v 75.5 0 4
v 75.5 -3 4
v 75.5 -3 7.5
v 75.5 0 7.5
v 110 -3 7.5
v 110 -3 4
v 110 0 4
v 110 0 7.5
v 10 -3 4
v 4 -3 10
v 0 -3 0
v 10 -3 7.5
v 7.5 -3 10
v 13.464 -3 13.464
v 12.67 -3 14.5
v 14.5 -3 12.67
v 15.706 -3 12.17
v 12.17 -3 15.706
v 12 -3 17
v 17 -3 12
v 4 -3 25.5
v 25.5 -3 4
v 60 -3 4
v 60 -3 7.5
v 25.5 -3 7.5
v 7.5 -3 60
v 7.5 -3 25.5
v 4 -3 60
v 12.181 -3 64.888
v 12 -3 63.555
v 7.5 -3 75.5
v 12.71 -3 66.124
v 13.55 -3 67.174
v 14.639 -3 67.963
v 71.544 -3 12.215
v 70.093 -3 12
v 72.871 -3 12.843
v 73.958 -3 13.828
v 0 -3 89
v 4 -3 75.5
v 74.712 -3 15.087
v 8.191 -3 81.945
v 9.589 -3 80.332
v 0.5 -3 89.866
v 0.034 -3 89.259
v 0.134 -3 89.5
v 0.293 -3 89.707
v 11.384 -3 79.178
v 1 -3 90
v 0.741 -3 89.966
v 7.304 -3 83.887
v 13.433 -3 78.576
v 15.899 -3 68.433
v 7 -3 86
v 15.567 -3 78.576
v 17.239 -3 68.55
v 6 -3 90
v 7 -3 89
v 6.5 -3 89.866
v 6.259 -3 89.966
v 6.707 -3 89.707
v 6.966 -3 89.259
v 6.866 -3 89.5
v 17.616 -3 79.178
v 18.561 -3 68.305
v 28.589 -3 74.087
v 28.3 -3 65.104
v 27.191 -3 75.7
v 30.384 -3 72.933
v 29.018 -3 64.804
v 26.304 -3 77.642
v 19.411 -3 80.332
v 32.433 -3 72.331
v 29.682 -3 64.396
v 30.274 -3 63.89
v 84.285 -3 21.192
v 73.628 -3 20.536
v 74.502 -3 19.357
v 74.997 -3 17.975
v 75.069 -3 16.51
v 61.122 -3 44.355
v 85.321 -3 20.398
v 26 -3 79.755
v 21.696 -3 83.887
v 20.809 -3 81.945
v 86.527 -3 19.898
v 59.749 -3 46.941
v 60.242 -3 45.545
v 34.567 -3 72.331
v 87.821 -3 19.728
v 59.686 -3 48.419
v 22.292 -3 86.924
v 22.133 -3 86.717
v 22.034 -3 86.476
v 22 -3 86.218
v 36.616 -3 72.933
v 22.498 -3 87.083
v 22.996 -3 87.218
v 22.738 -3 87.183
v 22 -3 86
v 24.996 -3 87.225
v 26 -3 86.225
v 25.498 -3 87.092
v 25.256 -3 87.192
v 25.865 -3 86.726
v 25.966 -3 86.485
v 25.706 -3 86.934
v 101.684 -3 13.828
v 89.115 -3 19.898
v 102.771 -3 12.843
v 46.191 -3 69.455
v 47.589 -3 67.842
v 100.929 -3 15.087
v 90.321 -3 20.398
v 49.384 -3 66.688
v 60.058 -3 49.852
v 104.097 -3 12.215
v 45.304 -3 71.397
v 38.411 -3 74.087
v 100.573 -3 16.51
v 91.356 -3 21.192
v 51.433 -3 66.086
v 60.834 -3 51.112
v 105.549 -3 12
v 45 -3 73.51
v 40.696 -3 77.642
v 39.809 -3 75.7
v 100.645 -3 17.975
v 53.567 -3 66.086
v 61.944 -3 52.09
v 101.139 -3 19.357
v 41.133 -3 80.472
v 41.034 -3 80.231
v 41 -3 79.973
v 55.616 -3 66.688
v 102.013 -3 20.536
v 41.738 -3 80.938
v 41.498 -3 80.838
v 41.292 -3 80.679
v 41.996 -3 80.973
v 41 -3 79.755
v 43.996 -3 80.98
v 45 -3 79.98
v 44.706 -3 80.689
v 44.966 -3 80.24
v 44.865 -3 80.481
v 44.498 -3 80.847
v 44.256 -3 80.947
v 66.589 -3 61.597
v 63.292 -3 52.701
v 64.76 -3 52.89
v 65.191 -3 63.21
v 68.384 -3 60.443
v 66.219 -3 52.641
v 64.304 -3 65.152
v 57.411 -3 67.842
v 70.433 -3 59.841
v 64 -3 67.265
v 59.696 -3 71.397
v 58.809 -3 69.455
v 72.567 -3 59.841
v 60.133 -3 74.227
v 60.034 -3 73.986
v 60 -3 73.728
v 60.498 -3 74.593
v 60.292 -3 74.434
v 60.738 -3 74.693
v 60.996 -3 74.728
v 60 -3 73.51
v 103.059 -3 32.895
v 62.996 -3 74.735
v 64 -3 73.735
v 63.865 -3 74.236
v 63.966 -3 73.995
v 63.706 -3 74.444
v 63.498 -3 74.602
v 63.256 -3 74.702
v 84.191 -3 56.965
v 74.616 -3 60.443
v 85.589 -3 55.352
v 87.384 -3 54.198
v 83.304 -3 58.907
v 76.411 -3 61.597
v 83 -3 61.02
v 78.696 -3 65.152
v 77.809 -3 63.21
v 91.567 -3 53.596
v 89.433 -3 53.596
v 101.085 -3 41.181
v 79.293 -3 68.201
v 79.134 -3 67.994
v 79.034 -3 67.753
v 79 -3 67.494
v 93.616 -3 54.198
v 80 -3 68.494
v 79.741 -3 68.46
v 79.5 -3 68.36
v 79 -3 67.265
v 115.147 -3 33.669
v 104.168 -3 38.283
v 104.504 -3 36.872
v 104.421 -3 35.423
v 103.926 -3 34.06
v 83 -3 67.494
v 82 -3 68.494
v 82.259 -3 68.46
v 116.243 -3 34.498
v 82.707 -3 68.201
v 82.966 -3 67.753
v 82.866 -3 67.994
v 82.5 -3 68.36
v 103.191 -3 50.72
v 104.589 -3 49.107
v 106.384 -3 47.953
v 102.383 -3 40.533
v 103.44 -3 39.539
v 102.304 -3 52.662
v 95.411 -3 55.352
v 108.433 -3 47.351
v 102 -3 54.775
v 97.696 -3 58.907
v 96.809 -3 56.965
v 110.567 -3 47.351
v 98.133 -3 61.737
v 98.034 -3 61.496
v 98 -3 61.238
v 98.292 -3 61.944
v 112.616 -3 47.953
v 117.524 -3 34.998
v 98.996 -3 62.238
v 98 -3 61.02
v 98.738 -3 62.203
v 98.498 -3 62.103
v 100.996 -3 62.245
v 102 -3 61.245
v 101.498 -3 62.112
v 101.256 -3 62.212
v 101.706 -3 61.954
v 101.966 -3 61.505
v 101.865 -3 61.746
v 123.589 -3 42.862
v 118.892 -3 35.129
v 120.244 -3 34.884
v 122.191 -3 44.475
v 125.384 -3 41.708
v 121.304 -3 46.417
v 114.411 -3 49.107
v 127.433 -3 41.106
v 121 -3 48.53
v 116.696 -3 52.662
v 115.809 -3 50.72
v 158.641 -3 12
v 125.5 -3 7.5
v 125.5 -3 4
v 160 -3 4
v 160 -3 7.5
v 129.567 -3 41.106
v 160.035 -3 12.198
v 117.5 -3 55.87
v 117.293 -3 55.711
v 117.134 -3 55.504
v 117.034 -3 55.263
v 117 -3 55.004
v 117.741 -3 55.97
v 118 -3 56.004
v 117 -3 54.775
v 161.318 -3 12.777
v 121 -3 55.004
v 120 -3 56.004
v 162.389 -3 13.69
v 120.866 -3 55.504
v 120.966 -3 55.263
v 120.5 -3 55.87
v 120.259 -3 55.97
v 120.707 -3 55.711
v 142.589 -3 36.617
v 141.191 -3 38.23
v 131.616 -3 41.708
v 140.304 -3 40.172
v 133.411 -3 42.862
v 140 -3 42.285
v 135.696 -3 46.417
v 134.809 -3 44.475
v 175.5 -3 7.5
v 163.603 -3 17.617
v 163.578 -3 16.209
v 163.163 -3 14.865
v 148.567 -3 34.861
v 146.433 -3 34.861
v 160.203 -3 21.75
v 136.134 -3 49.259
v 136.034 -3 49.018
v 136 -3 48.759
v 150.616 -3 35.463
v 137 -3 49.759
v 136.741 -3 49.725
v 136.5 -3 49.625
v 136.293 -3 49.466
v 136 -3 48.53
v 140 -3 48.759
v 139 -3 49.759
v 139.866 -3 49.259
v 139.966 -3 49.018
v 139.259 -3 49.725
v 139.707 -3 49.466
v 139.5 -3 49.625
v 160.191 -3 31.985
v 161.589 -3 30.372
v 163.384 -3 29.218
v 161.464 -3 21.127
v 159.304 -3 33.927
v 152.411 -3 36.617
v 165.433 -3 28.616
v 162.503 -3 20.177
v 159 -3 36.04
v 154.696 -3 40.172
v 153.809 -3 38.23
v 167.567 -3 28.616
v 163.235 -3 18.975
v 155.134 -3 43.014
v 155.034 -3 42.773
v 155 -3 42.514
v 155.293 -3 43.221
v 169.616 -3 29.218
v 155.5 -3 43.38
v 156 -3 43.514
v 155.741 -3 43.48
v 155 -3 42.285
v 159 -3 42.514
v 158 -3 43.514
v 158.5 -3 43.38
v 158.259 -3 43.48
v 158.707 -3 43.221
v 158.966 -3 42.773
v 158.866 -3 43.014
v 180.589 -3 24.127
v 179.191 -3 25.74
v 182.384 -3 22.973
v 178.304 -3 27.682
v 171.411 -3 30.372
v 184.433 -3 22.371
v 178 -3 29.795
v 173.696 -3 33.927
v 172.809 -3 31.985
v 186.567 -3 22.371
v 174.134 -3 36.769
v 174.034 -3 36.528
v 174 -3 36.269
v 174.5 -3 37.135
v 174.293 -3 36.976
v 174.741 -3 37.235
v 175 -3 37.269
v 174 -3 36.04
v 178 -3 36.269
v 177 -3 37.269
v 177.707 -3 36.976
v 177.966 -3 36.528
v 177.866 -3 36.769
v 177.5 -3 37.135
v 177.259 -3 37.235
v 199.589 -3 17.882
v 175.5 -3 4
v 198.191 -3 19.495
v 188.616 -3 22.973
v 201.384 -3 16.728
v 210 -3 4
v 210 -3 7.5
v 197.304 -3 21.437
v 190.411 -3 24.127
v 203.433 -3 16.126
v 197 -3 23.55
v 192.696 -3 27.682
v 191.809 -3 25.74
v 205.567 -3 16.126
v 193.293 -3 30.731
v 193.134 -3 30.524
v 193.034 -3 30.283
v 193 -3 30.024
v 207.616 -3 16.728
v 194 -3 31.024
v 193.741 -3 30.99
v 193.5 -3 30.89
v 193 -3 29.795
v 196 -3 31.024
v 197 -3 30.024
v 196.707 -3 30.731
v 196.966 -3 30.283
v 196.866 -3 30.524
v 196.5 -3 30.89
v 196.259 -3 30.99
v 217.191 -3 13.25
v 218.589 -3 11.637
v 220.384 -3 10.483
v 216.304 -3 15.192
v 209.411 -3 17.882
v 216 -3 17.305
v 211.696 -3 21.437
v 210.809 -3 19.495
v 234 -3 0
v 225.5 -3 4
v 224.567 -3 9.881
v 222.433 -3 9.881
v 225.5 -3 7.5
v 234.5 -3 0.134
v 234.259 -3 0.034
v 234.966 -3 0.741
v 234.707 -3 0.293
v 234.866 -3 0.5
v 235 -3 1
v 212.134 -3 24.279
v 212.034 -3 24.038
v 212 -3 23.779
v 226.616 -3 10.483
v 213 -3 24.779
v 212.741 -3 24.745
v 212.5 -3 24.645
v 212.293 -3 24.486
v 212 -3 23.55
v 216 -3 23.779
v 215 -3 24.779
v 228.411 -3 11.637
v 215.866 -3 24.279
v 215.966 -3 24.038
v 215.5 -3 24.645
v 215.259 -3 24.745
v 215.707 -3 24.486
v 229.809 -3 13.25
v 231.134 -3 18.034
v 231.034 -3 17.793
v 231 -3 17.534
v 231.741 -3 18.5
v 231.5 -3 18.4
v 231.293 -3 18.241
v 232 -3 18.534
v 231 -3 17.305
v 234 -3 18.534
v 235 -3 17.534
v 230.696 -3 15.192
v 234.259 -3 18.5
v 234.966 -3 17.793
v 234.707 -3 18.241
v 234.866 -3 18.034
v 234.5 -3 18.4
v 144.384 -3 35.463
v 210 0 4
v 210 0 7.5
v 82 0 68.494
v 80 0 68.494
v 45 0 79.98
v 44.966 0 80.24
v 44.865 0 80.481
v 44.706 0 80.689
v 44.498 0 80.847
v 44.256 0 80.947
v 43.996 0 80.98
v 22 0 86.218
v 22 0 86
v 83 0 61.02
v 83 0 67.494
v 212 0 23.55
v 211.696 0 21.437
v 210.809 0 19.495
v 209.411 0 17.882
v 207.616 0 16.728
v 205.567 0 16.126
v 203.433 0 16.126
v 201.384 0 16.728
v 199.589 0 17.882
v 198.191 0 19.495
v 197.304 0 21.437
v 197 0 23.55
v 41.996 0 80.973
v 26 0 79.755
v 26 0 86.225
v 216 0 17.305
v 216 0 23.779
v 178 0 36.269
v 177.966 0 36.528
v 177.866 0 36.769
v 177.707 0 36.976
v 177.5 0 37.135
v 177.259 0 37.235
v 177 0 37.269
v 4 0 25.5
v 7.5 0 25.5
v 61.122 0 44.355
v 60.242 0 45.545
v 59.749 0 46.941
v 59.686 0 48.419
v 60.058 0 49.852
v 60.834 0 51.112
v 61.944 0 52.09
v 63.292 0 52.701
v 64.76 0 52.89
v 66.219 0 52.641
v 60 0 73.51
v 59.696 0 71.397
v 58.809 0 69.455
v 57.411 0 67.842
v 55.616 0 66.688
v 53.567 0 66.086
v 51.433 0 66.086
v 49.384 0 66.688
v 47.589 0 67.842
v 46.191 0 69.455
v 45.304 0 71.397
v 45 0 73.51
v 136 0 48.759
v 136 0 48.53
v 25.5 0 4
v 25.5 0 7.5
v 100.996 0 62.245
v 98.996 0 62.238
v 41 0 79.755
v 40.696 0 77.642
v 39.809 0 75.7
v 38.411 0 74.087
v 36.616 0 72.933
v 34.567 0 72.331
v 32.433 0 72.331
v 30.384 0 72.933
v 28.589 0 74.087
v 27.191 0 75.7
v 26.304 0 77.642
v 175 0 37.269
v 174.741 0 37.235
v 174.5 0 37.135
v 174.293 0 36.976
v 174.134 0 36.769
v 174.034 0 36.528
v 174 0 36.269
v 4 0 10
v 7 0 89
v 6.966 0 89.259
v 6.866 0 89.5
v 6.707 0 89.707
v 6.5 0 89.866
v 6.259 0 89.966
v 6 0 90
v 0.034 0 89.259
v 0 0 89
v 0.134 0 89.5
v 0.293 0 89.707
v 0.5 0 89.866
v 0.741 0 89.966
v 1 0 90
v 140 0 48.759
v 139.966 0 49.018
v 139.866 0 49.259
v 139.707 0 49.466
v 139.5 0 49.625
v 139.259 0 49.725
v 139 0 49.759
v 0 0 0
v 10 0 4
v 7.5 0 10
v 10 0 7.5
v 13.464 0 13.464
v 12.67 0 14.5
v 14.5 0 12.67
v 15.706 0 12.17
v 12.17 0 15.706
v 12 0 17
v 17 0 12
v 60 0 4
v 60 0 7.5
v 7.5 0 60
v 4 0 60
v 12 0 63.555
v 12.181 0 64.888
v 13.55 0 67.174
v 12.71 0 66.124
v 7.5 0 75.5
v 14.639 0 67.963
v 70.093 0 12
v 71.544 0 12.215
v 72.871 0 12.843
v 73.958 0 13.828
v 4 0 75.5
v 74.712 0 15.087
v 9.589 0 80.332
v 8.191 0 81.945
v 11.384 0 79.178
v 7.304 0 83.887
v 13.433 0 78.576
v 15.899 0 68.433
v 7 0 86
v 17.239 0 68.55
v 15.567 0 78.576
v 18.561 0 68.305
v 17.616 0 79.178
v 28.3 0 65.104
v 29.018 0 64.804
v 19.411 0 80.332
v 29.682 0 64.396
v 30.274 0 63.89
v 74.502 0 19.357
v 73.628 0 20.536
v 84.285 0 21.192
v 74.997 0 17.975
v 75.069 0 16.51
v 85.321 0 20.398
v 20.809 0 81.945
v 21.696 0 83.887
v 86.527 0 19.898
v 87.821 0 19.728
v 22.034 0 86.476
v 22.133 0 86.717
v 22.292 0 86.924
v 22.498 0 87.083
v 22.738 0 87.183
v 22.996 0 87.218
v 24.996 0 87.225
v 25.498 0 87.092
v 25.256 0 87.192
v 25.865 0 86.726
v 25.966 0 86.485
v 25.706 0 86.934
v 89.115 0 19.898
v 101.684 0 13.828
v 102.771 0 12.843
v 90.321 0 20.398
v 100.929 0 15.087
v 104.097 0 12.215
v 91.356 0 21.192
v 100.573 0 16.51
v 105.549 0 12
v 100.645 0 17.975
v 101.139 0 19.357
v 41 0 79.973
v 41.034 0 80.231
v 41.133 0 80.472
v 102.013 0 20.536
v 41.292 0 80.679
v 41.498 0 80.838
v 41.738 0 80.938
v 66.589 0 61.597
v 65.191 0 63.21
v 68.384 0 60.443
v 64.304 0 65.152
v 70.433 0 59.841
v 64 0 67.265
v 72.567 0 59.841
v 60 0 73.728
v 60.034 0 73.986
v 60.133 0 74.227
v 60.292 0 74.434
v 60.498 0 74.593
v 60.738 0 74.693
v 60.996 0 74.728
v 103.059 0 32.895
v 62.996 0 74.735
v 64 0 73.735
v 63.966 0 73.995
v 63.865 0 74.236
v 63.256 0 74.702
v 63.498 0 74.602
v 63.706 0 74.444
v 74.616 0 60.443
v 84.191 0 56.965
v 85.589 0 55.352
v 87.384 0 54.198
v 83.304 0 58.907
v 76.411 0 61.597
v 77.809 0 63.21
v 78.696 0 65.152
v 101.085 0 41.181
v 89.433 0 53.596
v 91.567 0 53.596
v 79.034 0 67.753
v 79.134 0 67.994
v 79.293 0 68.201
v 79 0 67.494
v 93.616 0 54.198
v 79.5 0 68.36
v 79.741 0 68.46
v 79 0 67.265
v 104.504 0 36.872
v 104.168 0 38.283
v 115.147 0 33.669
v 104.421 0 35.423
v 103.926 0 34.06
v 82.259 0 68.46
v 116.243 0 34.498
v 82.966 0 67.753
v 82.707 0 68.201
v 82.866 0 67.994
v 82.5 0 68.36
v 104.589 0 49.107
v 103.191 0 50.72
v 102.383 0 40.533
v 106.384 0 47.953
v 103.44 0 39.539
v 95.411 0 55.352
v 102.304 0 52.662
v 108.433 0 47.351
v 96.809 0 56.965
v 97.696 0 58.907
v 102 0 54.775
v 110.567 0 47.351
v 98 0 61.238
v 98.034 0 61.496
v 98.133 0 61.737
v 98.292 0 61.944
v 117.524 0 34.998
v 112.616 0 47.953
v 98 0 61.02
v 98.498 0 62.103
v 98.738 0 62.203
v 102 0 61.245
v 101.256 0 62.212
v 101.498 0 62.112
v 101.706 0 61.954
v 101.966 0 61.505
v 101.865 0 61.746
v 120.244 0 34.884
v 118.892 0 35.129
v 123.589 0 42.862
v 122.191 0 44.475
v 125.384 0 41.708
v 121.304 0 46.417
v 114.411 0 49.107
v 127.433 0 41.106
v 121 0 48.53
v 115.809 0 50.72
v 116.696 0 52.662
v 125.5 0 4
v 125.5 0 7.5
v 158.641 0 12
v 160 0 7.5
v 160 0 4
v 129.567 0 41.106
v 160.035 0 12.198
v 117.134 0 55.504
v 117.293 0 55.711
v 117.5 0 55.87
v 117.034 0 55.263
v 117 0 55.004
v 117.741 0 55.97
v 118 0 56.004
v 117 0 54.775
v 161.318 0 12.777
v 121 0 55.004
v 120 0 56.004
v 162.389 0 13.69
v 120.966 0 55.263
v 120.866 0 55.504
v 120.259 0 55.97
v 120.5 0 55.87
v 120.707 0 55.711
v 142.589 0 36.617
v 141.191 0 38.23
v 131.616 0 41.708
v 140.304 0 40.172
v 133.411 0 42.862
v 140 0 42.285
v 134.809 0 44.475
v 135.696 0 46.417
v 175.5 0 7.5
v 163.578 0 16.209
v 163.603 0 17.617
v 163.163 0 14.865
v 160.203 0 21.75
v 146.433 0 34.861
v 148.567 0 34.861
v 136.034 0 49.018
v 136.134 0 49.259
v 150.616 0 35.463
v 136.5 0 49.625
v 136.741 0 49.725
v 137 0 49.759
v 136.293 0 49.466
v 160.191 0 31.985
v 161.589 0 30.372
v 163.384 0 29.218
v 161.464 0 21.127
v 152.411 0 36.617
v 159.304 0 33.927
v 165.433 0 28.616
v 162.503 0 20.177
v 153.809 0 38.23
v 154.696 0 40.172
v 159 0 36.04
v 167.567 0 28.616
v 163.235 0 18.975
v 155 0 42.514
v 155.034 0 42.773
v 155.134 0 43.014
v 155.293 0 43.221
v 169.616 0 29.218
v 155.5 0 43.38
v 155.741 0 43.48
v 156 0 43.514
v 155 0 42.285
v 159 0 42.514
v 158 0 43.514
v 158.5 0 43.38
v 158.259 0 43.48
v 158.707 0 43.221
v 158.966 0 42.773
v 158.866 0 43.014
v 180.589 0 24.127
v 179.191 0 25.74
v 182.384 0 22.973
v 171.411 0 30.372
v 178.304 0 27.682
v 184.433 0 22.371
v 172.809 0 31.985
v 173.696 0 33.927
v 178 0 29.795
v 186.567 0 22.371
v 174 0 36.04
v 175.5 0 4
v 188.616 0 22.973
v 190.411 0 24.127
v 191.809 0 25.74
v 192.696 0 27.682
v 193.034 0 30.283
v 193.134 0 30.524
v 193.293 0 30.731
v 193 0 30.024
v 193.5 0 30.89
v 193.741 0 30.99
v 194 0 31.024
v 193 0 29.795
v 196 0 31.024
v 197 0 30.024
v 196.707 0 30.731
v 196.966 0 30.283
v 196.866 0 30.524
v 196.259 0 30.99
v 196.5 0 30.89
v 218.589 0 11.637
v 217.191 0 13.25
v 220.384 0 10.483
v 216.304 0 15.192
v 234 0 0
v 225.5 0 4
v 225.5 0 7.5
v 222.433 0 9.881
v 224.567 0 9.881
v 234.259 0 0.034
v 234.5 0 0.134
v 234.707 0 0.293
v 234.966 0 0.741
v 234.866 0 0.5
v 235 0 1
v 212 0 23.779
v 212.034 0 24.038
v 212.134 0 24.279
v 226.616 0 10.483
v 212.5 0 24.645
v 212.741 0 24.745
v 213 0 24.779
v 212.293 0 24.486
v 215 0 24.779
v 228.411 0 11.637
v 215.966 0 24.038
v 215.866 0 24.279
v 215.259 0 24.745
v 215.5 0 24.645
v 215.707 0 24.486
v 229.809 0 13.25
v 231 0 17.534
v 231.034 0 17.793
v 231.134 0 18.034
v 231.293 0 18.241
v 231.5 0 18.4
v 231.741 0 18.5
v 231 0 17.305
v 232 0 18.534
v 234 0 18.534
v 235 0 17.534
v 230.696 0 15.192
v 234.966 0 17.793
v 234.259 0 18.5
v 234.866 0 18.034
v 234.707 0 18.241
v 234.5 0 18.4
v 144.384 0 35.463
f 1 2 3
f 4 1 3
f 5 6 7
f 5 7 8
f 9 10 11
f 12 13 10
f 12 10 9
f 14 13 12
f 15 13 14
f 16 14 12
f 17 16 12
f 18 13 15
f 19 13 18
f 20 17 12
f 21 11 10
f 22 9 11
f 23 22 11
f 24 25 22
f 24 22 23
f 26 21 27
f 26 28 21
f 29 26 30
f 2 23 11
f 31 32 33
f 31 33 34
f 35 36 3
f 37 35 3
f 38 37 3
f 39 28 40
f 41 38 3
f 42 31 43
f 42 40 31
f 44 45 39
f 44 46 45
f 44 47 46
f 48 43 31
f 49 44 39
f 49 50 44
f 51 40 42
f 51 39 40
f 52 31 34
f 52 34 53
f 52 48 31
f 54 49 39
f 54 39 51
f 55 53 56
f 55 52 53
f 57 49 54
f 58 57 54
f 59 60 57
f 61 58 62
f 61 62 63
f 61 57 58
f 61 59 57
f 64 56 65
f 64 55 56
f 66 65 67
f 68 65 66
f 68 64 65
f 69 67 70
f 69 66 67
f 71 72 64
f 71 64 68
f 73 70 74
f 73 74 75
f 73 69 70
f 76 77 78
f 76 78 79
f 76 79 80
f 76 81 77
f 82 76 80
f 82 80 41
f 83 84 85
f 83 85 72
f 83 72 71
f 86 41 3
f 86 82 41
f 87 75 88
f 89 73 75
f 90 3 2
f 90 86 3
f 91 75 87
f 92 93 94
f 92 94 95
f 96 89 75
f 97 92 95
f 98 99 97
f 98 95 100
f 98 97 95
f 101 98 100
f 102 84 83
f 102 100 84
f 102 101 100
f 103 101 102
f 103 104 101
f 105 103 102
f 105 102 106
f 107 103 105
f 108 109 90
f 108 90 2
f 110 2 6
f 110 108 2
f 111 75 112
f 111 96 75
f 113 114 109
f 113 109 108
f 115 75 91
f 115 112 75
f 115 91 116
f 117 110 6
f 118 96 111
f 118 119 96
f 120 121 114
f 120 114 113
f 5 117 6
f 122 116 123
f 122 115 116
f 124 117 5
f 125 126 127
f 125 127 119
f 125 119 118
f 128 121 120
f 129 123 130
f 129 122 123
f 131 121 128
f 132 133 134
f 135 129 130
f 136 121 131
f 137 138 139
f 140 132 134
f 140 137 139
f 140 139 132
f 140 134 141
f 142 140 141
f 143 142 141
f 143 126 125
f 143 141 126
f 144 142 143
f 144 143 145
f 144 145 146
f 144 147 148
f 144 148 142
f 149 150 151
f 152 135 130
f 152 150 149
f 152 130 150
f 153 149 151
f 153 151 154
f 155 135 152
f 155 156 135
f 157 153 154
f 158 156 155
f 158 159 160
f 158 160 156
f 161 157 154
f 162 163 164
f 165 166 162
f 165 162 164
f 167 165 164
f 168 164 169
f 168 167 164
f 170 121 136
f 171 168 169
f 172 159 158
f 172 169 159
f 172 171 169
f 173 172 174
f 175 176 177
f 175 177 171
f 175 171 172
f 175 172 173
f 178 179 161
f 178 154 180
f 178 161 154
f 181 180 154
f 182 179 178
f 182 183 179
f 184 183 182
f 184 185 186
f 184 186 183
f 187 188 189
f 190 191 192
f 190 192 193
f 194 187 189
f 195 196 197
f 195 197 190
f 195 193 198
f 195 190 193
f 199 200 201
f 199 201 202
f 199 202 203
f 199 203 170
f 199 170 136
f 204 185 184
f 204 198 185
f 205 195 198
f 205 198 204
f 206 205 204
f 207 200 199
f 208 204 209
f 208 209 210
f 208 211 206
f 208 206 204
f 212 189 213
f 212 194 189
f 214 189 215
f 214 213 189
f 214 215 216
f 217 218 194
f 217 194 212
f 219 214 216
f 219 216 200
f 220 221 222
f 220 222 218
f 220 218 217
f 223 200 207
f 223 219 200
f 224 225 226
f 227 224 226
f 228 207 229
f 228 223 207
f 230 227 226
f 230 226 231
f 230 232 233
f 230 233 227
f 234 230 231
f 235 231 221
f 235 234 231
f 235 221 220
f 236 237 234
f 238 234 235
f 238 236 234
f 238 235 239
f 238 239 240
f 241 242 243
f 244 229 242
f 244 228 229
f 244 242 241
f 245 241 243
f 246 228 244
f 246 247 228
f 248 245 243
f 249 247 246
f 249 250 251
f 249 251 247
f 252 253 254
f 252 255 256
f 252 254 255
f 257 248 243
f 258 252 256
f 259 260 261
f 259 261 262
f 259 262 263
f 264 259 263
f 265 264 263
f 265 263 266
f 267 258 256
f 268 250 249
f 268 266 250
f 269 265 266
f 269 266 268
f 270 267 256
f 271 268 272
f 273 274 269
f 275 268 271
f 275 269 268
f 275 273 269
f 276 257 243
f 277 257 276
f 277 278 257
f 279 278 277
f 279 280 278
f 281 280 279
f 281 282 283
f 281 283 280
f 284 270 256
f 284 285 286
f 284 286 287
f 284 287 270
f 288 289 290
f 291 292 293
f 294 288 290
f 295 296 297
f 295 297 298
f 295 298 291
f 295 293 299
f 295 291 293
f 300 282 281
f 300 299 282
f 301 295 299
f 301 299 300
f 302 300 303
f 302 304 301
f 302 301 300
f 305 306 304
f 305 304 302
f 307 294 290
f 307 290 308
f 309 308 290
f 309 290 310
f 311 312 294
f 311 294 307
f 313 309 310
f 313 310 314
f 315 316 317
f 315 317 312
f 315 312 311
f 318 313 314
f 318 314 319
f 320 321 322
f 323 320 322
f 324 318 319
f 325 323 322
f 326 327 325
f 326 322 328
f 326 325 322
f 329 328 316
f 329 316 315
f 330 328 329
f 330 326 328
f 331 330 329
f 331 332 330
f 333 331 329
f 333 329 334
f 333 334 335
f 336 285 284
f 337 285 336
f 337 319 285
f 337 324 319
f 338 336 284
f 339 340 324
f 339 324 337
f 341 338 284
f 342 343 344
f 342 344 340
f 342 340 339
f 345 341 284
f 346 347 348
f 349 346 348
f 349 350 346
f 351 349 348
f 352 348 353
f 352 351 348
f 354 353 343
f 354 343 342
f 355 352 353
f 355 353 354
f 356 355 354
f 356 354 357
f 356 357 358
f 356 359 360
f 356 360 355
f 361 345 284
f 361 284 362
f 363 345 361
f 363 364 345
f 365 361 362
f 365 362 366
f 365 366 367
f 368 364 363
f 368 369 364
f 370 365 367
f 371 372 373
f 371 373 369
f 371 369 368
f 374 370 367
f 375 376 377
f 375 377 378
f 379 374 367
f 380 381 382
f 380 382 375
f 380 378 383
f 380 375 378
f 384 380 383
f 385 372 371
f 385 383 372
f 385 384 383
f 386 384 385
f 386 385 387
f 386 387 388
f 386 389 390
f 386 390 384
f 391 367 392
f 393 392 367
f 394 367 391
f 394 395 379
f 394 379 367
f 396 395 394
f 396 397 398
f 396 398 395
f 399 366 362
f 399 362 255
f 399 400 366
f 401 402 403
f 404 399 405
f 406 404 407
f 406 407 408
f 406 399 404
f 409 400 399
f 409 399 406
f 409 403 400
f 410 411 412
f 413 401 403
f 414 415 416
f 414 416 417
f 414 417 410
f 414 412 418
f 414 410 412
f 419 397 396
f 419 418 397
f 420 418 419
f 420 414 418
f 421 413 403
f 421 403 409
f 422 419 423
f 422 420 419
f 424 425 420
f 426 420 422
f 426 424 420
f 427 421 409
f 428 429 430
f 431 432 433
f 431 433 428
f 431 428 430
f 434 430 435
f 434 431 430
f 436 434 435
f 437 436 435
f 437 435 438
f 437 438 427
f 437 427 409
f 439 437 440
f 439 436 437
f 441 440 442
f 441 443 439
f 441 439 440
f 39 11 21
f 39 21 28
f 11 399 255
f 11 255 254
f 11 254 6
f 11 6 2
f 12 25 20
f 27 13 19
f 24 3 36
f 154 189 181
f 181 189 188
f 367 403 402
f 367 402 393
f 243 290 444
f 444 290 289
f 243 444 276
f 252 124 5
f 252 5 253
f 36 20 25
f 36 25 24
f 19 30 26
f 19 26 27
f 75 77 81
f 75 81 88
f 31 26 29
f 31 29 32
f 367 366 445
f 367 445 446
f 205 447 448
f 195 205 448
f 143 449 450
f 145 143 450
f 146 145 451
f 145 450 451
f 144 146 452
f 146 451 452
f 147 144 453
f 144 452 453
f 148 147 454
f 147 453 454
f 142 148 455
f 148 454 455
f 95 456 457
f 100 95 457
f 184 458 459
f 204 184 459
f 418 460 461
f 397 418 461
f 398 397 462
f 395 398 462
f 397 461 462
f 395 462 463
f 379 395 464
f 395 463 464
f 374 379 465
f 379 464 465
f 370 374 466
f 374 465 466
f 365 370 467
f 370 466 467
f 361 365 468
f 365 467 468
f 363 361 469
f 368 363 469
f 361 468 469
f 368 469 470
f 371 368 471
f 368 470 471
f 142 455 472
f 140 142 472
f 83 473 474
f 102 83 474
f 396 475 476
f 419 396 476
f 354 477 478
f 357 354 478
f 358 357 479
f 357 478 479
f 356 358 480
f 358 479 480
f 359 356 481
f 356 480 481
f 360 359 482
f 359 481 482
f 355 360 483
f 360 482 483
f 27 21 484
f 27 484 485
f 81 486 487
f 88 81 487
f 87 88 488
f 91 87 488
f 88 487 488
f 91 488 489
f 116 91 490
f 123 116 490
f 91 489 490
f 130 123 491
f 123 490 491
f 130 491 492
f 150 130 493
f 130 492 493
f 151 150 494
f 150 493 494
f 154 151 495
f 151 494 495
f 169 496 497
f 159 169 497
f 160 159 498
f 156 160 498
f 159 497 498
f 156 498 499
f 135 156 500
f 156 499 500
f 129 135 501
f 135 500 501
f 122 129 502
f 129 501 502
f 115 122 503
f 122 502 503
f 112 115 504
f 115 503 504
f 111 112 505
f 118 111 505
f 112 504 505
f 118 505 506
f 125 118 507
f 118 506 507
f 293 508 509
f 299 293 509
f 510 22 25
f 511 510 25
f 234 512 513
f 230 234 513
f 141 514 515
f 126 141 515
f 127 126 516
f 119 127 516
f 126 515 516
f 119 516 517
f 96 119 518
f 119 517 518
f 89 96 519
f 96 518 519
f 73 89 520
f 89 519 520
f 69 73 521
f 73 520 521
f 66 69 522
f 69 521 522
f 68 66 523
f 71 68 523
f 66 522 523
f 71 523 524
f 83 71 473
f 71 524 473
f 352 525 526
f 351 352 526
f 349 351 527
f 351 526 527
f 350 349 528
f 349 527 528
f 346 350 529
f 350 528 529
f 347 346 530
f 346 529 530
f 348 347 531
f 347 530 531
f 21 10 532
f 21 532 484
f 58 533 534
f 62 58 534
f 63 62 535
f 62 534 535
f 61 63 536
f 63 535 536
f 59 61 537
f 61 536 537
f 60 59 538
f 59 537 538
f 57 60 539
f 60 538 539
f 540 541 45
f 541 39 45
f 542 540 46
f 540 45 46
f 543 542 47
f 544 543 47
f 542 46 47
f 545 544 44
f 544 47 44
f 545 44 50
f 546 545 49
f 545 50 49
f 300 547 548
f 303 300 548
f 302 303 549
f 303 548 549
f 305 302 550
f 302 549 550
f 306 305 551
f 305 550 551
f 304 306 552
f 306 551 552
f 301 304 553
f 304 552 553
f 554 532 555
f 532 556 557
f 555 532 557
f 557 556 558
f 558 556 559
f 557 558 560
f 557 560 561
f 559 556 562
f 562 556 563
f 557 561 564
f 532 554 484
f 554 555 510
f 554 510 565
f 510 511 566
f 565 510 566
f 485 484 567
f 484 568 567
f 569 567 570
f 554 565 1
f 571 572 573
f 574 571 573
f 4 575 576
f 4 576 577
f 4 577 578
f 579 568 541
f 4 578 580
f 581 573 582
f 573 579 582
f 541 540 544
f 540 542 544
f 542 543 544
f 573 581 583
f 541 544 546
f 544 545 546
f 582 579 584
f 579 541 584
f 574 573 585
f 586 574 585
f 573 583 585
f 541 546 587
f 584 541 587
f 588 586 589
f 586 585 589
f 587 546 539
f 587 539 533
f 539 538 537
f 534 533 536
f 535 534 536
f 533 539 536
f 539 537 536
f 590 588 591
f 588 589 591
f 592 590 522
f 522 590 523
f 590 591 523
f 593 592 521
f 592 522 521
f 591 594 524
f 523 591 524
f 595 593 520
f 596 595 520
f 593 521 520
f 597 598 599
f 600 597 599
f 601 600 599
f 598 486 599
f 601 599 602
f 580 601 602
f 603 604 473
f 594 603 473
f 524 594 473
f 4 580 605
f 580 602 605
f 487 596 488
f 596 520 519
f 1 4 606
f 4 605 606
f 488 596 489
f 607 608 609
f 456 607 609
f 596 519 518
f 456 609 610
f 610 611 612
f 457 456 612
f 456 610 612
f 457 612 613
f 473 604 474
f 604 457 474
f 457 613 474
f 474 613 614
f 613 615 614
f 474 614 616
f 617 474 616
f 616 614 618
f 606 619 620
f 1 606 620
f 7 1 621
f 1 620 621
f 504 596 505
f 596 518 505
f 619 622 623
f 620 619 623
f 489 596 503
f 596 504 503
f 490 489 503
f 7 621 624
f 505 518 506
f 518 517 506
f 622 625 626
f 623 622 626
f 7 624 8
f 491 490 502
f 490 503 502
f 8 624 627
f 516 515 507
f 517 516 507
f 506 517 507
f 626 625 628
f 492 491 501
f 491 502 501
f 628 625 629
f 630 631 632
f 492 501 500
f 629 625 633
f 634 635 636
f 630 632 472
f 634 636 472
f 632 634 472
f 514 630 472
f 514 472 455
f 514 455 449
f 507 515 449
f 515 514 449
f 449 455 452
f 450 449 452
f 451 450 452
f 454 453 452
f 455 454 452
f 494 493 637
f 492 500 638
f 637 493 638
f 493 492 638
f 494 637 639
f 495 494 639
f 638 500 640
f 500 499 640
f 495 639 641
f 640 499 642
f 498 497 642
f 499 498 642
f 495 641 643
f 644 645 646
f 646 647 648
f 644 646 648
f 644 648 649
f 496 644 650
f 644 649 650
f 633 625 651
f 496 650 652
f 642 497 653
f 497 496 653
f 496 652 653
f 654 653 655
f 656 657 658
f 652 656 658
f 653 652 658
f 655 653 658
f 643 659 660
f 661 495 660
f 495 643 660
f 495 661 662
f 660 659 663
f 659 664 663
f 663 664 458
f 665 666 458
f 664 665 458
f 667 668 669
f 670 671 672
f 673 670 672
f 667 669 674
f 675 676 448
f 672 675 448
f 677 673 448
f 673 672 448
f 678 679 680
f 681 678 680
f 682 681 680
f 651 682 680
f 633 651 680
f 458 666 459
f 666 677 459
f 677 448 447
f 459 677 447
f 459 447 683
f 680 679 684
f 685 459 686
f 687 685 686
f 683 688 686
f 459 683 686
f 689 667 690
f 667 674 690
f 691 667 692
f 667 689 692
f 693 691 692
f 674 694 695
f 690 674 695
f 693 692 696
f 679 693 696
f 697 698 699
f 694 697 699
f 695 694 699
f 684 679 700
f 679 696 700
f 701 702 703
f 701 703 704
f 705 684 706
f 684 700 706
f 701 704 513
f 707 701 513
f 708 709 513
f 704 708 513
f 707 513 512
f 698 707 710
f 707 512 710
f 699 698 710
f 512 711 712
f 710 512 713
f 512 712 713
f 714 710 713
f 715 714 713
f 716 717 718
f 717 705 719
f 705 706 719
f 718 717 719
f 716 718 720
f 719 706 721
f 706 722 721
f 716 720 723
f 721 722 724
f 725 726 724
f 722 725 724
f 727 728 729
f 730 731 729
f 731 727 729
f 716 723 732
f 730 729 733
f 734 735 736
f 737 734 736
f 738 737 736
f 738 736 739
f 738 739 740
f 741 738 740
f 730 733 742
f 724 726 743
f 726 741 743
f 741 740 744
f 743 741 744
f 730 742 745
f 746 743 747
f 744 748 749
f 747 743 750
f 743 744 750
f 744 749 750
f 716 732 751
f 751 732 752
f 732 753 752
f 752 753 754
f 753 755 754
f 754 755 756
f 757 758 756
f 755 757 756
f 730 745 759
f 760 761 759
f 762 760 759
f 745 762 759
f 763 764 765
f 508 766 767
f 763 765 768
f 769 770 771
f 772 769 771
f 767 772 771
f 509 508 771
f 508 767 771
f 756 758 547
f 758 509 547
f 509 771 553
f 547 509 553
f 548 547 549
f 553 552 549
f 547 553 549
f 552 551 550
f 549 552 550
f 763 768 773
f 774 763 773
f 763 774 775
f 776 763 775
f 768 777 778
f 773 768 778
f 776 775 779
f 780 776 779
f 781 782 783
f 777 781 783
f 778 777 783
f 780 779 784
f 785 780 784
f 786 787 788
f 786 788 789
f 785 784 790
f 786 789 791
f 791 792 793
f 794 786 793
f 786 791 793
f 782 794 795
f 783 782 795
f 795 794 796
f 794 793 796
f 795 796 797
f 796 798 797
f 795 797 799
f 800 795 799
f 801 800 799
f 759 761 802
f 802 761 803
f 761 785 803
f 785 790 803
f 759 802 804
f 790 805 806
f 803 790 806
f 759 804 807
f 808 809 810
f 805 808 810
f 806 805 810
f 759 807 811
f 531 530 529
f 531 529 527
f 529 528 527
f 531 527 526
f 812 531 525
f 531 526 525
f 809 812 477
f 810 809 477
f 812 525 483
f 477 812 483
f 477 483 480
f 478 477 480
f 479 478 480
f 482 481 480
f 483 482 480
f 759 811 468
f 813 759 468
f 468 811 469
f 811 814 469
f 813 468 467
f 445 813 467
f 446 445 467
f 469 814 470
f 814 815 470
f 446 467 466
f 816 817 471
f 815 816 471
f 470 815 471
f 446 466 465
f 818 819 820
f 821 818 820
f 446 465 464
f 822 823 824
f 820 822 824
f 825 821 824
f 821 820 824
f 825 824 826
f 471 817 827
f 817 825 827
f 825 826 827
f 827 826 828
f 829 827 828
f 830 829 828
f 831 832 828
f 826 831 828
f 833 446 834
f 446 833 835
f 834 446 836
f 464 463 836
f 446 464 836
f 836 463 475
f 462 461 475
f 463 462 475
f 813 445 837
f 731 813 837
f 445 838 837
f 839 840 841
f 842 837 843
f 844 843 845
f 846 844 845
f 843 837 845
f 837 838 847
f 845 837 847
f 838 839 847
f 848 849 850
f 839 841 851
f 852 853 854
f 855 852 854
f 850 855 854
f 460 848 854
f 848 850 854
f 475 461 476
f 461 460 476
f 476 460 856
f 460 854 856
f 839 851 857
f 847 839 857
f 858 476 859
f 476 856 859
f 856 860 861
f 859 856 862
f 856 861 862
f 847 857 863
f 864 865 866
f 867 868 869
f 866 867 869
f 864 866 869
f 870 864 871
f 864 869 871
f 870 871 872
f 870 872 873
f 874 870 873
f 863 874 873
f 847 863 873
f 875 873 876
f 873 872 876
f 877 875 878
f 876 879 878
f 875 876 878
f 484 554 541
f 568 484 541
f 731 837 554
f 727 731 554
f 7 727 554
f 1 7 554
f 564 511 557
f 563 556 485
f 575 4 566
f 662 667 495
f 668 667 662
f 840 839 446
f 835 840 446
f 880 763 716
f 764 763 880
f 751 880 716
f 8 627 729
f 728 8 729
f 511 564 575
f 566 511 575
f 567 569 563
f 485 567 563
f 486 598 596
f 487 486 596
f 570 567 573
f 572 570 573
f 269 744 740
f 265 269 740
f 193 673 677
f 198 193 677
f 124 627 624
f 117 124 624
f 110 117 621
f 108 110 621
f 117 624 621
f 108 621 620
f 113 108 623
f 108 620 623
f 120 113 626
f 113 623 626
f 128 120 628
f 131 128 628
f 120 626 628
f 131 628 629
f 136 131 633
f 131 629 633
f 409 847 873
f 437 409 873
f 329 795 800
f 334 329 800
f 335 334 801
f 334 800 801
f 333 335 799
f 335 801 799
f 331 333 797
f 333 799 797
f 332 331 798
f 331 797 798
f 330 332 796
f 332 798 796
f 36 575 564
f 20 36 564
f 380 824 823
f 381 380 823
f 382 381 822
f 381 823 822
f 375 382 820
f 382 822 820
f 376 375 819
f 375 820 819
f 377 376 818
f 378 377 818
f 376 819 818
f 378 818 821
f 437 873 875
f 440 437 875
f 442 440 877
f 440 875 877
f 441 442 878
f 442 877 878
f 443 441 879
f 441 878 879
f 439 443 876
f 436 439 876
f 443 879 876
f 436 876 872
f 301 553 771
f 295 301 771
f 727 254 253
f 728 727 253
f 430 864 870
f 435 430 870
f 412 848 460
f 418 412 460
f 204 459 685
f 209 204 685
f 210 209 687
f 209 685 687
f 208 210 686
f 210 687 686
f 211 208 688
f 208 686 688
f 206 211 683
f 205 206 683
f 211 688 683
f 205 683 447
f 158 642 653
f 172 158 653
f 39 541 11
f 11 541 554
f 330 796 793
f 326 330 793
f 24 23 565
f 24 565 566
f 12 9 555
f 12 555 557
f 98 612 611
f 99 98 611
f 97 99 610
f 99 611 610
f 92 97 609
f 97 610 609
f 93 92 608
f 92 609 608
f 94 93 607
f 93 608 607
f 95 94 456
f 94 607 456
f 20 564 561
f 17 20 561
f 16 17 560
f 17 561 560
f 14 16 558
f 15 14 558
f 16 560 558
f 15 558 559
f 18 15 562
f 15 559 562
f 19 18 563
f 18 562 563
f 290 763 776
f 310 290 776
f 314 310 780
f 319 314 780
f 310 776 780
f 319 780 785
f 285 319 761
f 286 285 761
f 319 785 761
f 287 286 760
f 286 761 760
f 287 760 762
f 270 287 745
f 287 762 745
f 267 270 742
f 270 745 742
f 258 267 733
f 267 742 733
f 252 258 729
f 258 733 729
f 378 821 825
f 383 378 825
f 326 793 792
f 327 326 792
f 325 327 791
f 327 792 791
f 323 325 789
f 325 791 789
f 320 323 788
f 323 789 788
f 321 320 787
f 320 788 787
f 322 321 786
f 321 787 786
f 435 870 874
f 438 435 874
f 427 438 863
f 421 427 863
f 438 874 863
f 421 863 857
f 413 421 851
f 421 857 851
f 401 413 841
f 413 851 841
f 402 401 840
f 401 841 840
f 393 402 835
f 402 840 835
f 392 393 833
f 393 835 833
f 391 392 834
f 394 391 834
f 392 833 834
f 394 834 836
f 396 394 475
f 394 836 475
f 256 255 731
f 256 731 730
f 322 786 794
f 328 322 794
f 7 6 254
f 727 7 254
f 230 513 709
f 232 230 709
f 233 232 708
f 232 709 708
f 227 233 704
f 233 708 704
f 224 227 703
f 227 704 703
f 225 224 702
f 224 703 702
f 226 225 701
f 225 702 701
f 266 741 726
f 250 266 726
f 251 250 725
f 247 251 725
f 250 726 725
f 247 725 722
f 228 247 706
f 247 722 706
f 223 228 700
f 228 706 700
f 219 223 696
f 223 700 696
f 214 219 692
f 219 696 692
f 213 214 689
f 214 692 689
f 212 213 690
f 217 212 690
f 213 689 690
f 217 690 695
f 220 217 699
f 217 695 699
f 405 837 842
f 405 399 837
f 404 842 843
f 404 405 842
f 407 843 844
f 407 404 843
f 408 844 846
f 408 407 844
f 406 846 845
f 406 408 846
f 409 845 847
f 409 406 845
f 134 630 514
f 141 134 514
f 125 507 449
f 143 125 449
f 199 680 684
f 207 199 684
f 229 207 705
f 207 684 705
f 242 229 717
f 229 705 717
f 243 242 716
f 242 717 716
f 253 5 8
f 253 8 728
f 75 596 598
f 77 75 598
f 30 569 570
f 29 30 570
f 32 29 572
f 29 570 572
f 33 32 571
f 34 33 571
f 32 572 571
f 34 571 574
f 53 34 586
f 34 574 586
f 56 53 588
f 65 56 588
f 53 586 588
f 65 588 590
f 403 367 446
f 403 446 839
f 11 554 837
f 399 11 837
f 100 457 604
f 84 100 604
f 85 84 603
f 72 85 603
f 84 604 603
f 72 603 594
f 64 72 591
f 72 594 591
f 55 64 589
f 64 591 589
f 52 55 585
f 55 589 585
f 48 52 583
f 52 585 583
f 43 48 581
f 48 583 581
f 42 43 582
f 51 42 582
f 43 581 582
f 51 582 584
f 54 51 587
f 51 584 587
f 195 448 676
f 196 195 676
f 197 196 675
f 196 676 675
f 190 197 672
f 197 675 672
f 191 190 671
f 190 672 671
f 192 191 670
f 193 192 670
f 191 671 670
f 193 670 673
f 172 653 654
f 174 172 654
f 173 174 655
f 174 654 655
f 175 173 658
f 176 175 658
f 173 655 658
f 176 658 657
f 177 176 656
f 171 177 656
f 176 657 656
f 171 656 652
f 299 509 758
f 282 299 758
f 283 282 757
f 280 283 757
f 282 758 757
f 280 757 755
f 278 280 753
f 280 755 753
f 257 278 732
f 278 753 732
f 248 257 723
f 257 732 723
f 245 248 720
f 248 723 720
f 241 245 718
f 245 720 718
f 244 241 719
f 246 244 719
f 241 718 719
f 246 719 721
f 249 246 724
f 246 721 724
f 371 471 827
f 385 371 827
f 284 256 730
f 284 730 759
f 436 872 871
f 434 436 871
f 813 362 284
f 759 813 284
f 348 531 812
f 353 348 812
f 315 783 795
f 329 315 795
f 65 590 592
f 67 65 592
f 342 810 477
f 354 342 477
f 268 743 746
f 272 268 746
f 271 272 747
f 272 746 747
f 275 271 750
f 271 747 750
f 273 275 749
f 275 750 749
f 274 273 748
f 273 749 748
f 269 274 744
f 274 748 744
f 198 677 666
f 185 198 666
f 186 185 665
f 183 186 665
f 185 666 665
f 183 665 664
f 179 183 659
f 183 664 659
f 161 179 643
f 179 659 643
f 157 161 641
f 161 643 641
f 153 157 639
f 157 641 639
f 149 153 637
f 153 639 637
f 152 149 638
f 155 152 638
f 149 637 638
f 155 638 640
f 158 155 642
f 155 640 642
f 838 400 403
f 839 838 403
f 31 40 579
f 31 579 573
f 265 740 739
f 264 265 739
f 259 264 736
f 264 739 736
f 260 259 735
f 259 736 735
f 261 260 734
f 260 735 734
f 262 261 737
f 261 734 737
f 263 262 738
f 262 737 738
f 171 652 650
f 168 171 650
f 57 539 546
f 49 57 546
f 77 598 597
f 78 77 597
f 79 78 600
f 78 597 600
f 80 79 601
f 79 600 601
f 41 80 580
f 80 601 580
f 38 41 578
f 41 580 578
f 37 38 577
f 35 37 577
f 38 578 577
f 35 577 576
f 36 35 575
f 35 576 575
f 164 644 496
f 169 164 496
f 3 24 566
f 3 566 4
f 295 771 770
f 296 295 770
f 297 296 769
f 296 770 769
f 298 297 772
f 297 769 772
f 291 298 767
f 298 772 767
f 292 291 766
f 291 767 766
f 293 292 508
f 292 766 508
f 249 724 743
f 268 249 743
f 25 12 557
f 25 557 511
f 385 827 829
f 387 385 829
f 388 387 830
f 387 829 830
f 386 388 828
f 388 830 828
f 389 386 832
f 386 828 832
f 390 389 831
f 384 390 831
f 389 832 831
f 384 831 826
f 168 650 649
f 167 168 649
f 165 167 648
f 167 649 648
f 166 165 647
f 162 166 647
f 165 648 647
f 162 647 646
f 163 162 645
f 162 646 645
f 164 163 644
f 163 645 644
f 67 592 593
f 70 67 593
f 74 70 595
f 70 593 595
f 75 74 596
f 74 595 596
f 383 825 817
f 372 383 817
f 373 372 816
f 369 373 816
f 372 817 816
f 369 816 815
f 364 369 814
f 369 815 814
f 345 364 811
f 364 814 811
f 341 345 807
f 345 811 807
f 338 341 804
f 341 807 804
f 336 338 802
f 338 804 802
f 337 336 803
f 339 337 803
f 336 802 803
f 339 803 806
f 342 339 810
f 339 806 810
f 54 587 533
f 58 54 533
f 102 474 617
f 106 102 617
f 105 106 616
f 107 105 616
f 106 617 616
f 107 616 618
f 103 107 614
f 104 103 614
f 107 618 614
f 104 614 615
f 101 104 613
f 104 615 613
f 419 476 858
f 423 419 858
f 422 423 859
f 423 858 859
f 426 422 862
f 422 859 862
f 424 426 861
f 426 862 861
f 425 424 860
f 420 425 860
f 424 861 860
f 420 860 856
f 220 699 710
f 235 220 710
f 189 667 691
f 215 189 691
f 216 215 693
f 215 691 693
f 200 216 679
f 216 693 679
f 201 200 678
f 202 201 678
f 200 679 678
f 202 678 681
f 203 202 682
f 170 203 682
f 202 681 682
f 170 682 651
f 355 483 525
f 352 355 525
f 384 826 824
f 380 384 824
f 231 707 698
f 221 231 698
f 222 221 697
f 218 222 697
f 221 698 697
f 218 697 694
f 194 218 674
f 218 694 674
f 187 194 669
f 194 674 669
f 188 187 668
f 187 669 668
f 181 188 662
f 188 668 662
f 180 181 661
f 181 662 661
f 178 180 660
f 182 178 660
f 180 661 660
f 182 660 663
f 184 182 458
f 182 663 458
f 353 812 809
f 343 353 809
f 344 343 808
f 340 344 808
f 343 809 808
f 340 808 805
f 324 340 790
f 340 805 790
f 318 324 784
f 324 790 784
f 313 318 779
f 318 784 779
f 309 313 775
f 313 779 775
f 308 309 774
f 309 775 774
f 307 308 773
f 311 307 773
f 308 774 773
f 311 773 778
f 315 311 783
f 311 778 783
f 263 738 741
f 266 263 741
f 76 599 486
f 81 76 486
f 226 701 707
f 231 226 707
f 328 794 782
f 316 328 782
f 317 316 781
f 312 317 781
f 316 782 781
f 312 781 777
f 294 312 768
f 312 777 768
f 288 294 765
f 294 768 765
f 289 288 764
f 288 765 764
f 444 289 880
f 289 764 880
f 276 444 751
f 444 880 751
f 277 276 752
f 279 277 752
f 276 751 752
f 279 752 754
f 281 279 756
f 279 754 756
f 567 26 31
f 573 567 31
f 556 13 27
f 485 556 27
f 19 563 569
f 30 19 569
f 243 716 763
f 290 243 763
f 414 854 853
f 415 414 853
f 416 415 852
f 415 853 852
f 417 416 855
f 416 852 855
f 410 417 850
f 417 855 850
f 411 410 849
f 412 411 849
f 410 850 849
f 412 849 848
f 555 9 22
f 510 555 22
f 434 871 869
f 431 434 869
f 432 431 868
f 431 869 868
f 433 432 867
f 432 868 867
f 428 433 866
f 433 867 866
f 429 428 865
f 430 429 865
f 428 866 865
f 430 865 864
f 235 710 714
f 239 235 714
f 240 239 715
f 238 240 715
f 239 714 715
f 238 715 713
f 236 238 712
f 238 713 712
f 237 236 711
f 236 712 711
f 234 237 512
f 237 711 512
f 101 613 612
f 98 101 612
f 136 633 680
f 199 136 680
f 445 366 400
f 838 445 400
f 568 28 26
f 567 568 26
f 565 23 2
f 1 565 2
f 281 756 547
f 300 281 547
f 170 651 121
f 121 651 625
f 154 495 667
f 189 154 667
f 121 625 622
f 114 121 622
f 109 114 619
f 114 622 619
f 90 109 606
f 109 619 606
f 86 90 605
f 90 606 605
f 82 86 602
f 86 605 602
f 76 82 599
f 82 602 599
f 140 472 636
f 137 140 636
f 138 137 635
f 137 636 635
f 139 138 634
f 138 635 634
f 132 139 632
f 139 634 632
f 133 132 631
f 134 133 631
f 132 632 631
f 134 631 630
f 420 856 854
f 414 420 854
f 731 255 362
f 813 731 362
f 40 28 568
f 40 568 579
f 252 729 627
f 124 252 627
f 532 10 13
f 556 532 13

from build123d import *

# Parameters (mm, degrees)
F1_DEPTH = 3
F2_R     = 1
F3_W     = 15.5
F3_H     = 3.5
F3_W_2   = 3.5
F3_H_2   = 15.5
F4_DEPTH = 25


with BuildPart() as f1:
    # F0 (on Front) → F1 (new body)
    with BuildSketch(Plane.XZ):
        with BuildLine():
            Line((0, 90), (0, 0))
            Line((0, 0), (235, 0))
            Line((235, 0), (235, 17.5337082297))
            ThreePointArc((235, 17.5337082297), (234.7071067812, 18.2408150109), (234, 18.5337082297))
            Line((234, 18.5337082297), (232, 18.5337082297))
            ThreePointArc((232, 18.5337082297), (231.2928932188, 18.2408150109), (231, 17.5337082297))
            Line((231, 17.5337082297), (231, 17.3050220176))
            ThreePointArc((231, 17.3050220176), (223.5, 9.8050220176), (216, 17.3050220176))
            Line((216, 17.3050220176), (216, 21.3050220176))
            Line((216, 21.3050220176), (216, 23.7787062281))
            ThreePointArc((216, 23.7787062281), (215.7071067812, 24.4858130093), (215, 24.7787062281))
            Line((215, 24.7787062281), (213, 24.7787062281))
            ThreePointArc((213, 24.7787062281), (212.2928932188, 24.4858130093), (212, 23.7787062281))
            Line((212, 23.7787062281), (212, 23.550020016))
            ThreePointArc((212, 23.550020016), (204.5, 16.050020016), (197, 23.550020016))
            Line((197, 23.550020016), (197, 27.550020016))
            Line((197, 27.550020016), (197, 30.0237042265))
            ThreePointArc((197, 30.0237042265), (196.7071067812, 30.7308110077), (196, 31.0237042265))
            Line((196, 31.0237042265), (194, 31.0237042265))
            ThreePointArc((194, 31.0237042265), (193.2928932188, 30.7308110077), (193, 30.0237042265))
            Line((193, 30.0237042265), (193, 29.7950180144))
            ThreePointArc((193, 29.7950180144), (185.5, 22.2950180144), (178, 29.7950180144))
            Line((178, 29.7950180144), (178, 33.7950180144))
            Line((178, 33.7950180144), (178, 36.2687022249))
            ThreePointArc((178, 36.2687022249), (177.7071067812, 36.9758090061), (177, 37.2687022249))
            Line((177, 37.2687022249), (175, 37.2687022249))
            ThreePointArc((175, 37.2687022249), (174.2928932188, 36.9758090061), (174, 36.2687022249))
            Line((174, 36.2687022249), (174, 36.0400160128))
            ThreePointArc((174, 36.0400160128), (166.5, 28.5400160128), (159, 36.0400160128))
            Line((159, 36.0400160128), (159, 40.0400160128))
            Line((159, 40.0400160128), (159, 42.5137002233))
            ThreePointArc((159, 42.5137002233), (158.7071067812, 43.2208070045), (158, 43.5137002233))
            Line((158, 43.5137002233), (156, 43.5137002233))
            ThreePointArc((156, 43.5137002233), (155.2928932188, 43.2208070045), (155, 42.5137002233))
            Line((155, 42.5137002233), (155, 42.2850140112))
            ThreePointArc((155, 42.2850140112), (147.5, 34.7850140112), (140, 42.2850140112))
            Line((140, 42.2850140112), (140, 46.2850140112))
            Line((140, 46.2850140112), (140, 48.7586982217))
            ThreePointArc((140, 48.7586982217), (139.7071067812, 49.4658050029), (139, 49.7586982217))
            Line((139, 49.7586982217), (137, 49.7586982217))
            ThreePointArc((137, 49.7586982217), (136.2928932188, 49.4658050029), (136, 48.7586982217))
            Line((136, 48.7586982217), (136, 48.5300120096))
            ThreePointArc((136, 48.5300120096), (128.5, 41.0300120096), (121, 48.5300120096))
            Line((121, 48.5300120096), (121, 52.5300120096))
            Line((121, 52.5300120096), (121, 55.0036962201))
            ThreePointArc((121, 55.0036962201), (120.7071067812, 55.7108030013), (120, 56.0036962201))
            Line((120, 56.0036962201), (118, 56.0036962201))
            ThreePointArc((118, 56.0036962201), (117.2928932188, 55.7108030013), (117, 55.0036962201))
            Line((117, 55.0036962201), (117, 54.775010008))
            ThreePointArc((117, 54.775010008), (109.5, 47.275010008), (102, 54.775010008))
            Line((102, 54.775010008), (102, 58.775010008))
            Line((102, 58.775010008), (102, 61.2451730918))
            ThreePointArc((102, 61.2451730918), (101.7058629727, 61.9535214974), (100.9964850724, 62.2451669144))
            Line((100.9964850724, 62.2451669144), (98.9964850724, 62.2381370157))
            ThreePointArc((98.9964850724, 62.2381370157), (98.2916515943, 61.9440061658), (98, 61.2381431931))
            Line((98, 61.2381431931), (98, 61.0200080064))
            ThreePointArc((98, 61.0200080064), (90.5, 53.5200080064), (83, 61.0200080064))
            Line((83, 61.0200080064), (83, 65.0200080064))
            Line((83, 65.0200080064), (83, 67.4936922169))
            ThreePointArc((83, 67.4936922169), (82.7071067812, 68.2007989981), (82, 68.4936922169))
            Line((82, 68.4936922169), (80, 68.4936922169))
            ThreePointArc((80, 68.4936922169), (79.2928932188, 68.2007989981), (79, 67.4936922169))
            Line((79, 67.4936922169), (79, 67.2650060048))
            ThreePointArc((79, 67.2650060048), (71.5, 59.7650060048), (64, 67.2650060048))
            Line((64, 67.2650060048), (64, 71.2650060048))
            Line((64, 71.2650060048), (64, 73.7351690886))
            ThreePointArc((64, 73.7351690886), (63.7058629727, 74.4435174942), (62.9964850724, 74.7351629112))
            Line((62.9964850724, 74.7351629112), (60.9964850724, 74.7281330125))
            ThreePointArc((60.9964850724, 74.7281330125), (60.2916515943, 74.4340021625), (60, 73.7281391899))
            Line((60, 73.7281391899), (60, 73.5100040032))
            ThreePointArc((60, 73.5100040032), (52.5, 66.0100040032), (45, 73.5100040032))
            Line((45, 73.5100040032), (45, 77.5100040032))
            Line((45, 77.5100040032), (45, 79.980167087))
            ThreePointArc((45, 79.980167087), (44.7058629727, 80.6885154926), (43.9964850724, 80.9801609096))
            Line((43.9964850724, 80.9801609096), (41.9964850724, 80.9731310109))
            ThreePointArc((41.9964850724, 80.9731310109), (41.2916515943, 80.6790001609), (41, 79.9731371883))
            Line((41, 79.9731371883), (41, 79.7550020016))
            ThreePointArc((41, 79.7550020016), (33.5, 72.2550020016), (26, 79.7550020016))
            Line((26, 79.7550020016), (26, 83.7550020016))
            Line((26, 83.7550020016), (26, 86.2251650854))
            ThreePointArc((26, 86.2251650854), (25.7058629727, 86.933513491), (24.9964850724, 87.225158908))
            Line((24.9964850724, 87.225158908), (22.9964850724, 87.2181290093))
            ThreePointArc((22.9964850724, 87.2181290093), (22.2916515943, 86.9239981593), (22, 86.2181351867))
            Line((22, 86.2181351867), (22, 86))
            ThreePointArc((22, 86), (14.5, 78.5), (7, 86))
            Line((7, 86), (7, 89))
            ThreePointArc((7, 89), (6.7071067812, 89.7071067812), (6, 90))
            Line((6, 90), (0, 90))
        make_face()
        with BuildLine():
            ThreePointArc((17, 12), (13.4644660941, 13.4644660941), (12, 17))
            Line((12, 17), (12, 63.5552642114))
            ThreePointArc((12, 63.5552642114), (14.0679569834, 67.6053412167), (18.5612494996, 68.3052642114))
            Line((18.5612494996, 68.3052642114), (28.2995777656, 65.1044304993))
            ThreePointArc((28.2995777656, 65.1044304993), (29.3580672309, 64.6131824005), (30.273862172, 63.8899644052))
            Line((30.273862172, 63.8899644052), (73.6282926713, 20.5355339059))
            ThreePointArc((73.6282926713, 20.5355339059), (74.7121564279, 15.0865828382), (70.0927587654, 12))
            Line((70.0927587654, 12), (17, 12))
        make_face(mode=Mode.SUBTRACT)
        with BuildLine():
            Line((103.0593050185, 32.8954784413), (91.3562147326, 21.1923881554))
            ThreePointArc((91.3562147326, 21.1923881554), (87.8206808267, 19.7279220614), (84.2851469208, 21.1923881554))
            Line((84.2851469208, 21.1923881554), (61.1221171694, 44.3554179068))
            ThreePointArc((61.1221171694, 44.3554179068), (60.3988991741, 50.5106907776), (66.2189005749, 52.6409518128))
            Line((66.2189005749, 52.6409518128), (101.0850206122, 41.1810123472))
            ThreePointArc((101.0850206122, 41.1810123472), (104.3875986483, 37.589969509), (103.0593050185, 32.8954784413))
        make_face(mode=Mode.SUBTRACT)
        with BuildLine():
            ThreePointArc((160.202611153, 21.75), (163.578466068, 16.209430585), (158.6413616534, 12))
            Line((158.6413616534, 12), (105.5486028881, 12))
            ThreePointArc((105.5486028881, 12), (100.9292052255, 15.0865828382), (102.0130689821, 20.5355339059))
            Line((102.0130689821, 20.5355339059), (115.1469251322, 33.669390056))
            ThreePointArc((115.1469251322, 33.669390056), (117.5235018764, 34.9976836858), (120.2437085377, 34.88385615))
            Line((120.2437085377, 34.88385615), (160.202611153, 21.75))
        make_face(mode=Mode.SUBTRACT)
    extrude(amount=F1_DEPTH)

    # F2
    f2_edges = [f1.edges().sort_by_distance(p)[0] for p in [
        (235, -1.5, 0),
        (0, -1.5, 90),
    ]]
    fillet(f2_edges, radius=F2_R)

    # F3 (on face) → F4 (cut)
    with BuildSketch(Plane.XZ.offset(3)):
        with Locations((17.75, 5.75)):
            Rectangle(F3_W, F3_H)
        with Locations((5.75, 17.75)):
            Rectangle(F3_W_2, F3_H_2)
        with Locations((5.75, 67.75)):
            Rectangle(F3_W_2, F3_H_2)
        with Locations((67.75, 5.75)):
            Rectangle(F3_W, F3_H)
        with Locations((117.75, 5.75)):
            Rectangle(F3_W, F3_H)
        with Locations((167.75, 5.75)):
            Rectangle(F3_W, F3_H)
        with Locations((217.75, 5.75)):
            Rectangle(F3_W, F3_H)
    extrude(amount=-F4_DEPTH, mode=Mode.SUBTRACT)


solid = f1.part
